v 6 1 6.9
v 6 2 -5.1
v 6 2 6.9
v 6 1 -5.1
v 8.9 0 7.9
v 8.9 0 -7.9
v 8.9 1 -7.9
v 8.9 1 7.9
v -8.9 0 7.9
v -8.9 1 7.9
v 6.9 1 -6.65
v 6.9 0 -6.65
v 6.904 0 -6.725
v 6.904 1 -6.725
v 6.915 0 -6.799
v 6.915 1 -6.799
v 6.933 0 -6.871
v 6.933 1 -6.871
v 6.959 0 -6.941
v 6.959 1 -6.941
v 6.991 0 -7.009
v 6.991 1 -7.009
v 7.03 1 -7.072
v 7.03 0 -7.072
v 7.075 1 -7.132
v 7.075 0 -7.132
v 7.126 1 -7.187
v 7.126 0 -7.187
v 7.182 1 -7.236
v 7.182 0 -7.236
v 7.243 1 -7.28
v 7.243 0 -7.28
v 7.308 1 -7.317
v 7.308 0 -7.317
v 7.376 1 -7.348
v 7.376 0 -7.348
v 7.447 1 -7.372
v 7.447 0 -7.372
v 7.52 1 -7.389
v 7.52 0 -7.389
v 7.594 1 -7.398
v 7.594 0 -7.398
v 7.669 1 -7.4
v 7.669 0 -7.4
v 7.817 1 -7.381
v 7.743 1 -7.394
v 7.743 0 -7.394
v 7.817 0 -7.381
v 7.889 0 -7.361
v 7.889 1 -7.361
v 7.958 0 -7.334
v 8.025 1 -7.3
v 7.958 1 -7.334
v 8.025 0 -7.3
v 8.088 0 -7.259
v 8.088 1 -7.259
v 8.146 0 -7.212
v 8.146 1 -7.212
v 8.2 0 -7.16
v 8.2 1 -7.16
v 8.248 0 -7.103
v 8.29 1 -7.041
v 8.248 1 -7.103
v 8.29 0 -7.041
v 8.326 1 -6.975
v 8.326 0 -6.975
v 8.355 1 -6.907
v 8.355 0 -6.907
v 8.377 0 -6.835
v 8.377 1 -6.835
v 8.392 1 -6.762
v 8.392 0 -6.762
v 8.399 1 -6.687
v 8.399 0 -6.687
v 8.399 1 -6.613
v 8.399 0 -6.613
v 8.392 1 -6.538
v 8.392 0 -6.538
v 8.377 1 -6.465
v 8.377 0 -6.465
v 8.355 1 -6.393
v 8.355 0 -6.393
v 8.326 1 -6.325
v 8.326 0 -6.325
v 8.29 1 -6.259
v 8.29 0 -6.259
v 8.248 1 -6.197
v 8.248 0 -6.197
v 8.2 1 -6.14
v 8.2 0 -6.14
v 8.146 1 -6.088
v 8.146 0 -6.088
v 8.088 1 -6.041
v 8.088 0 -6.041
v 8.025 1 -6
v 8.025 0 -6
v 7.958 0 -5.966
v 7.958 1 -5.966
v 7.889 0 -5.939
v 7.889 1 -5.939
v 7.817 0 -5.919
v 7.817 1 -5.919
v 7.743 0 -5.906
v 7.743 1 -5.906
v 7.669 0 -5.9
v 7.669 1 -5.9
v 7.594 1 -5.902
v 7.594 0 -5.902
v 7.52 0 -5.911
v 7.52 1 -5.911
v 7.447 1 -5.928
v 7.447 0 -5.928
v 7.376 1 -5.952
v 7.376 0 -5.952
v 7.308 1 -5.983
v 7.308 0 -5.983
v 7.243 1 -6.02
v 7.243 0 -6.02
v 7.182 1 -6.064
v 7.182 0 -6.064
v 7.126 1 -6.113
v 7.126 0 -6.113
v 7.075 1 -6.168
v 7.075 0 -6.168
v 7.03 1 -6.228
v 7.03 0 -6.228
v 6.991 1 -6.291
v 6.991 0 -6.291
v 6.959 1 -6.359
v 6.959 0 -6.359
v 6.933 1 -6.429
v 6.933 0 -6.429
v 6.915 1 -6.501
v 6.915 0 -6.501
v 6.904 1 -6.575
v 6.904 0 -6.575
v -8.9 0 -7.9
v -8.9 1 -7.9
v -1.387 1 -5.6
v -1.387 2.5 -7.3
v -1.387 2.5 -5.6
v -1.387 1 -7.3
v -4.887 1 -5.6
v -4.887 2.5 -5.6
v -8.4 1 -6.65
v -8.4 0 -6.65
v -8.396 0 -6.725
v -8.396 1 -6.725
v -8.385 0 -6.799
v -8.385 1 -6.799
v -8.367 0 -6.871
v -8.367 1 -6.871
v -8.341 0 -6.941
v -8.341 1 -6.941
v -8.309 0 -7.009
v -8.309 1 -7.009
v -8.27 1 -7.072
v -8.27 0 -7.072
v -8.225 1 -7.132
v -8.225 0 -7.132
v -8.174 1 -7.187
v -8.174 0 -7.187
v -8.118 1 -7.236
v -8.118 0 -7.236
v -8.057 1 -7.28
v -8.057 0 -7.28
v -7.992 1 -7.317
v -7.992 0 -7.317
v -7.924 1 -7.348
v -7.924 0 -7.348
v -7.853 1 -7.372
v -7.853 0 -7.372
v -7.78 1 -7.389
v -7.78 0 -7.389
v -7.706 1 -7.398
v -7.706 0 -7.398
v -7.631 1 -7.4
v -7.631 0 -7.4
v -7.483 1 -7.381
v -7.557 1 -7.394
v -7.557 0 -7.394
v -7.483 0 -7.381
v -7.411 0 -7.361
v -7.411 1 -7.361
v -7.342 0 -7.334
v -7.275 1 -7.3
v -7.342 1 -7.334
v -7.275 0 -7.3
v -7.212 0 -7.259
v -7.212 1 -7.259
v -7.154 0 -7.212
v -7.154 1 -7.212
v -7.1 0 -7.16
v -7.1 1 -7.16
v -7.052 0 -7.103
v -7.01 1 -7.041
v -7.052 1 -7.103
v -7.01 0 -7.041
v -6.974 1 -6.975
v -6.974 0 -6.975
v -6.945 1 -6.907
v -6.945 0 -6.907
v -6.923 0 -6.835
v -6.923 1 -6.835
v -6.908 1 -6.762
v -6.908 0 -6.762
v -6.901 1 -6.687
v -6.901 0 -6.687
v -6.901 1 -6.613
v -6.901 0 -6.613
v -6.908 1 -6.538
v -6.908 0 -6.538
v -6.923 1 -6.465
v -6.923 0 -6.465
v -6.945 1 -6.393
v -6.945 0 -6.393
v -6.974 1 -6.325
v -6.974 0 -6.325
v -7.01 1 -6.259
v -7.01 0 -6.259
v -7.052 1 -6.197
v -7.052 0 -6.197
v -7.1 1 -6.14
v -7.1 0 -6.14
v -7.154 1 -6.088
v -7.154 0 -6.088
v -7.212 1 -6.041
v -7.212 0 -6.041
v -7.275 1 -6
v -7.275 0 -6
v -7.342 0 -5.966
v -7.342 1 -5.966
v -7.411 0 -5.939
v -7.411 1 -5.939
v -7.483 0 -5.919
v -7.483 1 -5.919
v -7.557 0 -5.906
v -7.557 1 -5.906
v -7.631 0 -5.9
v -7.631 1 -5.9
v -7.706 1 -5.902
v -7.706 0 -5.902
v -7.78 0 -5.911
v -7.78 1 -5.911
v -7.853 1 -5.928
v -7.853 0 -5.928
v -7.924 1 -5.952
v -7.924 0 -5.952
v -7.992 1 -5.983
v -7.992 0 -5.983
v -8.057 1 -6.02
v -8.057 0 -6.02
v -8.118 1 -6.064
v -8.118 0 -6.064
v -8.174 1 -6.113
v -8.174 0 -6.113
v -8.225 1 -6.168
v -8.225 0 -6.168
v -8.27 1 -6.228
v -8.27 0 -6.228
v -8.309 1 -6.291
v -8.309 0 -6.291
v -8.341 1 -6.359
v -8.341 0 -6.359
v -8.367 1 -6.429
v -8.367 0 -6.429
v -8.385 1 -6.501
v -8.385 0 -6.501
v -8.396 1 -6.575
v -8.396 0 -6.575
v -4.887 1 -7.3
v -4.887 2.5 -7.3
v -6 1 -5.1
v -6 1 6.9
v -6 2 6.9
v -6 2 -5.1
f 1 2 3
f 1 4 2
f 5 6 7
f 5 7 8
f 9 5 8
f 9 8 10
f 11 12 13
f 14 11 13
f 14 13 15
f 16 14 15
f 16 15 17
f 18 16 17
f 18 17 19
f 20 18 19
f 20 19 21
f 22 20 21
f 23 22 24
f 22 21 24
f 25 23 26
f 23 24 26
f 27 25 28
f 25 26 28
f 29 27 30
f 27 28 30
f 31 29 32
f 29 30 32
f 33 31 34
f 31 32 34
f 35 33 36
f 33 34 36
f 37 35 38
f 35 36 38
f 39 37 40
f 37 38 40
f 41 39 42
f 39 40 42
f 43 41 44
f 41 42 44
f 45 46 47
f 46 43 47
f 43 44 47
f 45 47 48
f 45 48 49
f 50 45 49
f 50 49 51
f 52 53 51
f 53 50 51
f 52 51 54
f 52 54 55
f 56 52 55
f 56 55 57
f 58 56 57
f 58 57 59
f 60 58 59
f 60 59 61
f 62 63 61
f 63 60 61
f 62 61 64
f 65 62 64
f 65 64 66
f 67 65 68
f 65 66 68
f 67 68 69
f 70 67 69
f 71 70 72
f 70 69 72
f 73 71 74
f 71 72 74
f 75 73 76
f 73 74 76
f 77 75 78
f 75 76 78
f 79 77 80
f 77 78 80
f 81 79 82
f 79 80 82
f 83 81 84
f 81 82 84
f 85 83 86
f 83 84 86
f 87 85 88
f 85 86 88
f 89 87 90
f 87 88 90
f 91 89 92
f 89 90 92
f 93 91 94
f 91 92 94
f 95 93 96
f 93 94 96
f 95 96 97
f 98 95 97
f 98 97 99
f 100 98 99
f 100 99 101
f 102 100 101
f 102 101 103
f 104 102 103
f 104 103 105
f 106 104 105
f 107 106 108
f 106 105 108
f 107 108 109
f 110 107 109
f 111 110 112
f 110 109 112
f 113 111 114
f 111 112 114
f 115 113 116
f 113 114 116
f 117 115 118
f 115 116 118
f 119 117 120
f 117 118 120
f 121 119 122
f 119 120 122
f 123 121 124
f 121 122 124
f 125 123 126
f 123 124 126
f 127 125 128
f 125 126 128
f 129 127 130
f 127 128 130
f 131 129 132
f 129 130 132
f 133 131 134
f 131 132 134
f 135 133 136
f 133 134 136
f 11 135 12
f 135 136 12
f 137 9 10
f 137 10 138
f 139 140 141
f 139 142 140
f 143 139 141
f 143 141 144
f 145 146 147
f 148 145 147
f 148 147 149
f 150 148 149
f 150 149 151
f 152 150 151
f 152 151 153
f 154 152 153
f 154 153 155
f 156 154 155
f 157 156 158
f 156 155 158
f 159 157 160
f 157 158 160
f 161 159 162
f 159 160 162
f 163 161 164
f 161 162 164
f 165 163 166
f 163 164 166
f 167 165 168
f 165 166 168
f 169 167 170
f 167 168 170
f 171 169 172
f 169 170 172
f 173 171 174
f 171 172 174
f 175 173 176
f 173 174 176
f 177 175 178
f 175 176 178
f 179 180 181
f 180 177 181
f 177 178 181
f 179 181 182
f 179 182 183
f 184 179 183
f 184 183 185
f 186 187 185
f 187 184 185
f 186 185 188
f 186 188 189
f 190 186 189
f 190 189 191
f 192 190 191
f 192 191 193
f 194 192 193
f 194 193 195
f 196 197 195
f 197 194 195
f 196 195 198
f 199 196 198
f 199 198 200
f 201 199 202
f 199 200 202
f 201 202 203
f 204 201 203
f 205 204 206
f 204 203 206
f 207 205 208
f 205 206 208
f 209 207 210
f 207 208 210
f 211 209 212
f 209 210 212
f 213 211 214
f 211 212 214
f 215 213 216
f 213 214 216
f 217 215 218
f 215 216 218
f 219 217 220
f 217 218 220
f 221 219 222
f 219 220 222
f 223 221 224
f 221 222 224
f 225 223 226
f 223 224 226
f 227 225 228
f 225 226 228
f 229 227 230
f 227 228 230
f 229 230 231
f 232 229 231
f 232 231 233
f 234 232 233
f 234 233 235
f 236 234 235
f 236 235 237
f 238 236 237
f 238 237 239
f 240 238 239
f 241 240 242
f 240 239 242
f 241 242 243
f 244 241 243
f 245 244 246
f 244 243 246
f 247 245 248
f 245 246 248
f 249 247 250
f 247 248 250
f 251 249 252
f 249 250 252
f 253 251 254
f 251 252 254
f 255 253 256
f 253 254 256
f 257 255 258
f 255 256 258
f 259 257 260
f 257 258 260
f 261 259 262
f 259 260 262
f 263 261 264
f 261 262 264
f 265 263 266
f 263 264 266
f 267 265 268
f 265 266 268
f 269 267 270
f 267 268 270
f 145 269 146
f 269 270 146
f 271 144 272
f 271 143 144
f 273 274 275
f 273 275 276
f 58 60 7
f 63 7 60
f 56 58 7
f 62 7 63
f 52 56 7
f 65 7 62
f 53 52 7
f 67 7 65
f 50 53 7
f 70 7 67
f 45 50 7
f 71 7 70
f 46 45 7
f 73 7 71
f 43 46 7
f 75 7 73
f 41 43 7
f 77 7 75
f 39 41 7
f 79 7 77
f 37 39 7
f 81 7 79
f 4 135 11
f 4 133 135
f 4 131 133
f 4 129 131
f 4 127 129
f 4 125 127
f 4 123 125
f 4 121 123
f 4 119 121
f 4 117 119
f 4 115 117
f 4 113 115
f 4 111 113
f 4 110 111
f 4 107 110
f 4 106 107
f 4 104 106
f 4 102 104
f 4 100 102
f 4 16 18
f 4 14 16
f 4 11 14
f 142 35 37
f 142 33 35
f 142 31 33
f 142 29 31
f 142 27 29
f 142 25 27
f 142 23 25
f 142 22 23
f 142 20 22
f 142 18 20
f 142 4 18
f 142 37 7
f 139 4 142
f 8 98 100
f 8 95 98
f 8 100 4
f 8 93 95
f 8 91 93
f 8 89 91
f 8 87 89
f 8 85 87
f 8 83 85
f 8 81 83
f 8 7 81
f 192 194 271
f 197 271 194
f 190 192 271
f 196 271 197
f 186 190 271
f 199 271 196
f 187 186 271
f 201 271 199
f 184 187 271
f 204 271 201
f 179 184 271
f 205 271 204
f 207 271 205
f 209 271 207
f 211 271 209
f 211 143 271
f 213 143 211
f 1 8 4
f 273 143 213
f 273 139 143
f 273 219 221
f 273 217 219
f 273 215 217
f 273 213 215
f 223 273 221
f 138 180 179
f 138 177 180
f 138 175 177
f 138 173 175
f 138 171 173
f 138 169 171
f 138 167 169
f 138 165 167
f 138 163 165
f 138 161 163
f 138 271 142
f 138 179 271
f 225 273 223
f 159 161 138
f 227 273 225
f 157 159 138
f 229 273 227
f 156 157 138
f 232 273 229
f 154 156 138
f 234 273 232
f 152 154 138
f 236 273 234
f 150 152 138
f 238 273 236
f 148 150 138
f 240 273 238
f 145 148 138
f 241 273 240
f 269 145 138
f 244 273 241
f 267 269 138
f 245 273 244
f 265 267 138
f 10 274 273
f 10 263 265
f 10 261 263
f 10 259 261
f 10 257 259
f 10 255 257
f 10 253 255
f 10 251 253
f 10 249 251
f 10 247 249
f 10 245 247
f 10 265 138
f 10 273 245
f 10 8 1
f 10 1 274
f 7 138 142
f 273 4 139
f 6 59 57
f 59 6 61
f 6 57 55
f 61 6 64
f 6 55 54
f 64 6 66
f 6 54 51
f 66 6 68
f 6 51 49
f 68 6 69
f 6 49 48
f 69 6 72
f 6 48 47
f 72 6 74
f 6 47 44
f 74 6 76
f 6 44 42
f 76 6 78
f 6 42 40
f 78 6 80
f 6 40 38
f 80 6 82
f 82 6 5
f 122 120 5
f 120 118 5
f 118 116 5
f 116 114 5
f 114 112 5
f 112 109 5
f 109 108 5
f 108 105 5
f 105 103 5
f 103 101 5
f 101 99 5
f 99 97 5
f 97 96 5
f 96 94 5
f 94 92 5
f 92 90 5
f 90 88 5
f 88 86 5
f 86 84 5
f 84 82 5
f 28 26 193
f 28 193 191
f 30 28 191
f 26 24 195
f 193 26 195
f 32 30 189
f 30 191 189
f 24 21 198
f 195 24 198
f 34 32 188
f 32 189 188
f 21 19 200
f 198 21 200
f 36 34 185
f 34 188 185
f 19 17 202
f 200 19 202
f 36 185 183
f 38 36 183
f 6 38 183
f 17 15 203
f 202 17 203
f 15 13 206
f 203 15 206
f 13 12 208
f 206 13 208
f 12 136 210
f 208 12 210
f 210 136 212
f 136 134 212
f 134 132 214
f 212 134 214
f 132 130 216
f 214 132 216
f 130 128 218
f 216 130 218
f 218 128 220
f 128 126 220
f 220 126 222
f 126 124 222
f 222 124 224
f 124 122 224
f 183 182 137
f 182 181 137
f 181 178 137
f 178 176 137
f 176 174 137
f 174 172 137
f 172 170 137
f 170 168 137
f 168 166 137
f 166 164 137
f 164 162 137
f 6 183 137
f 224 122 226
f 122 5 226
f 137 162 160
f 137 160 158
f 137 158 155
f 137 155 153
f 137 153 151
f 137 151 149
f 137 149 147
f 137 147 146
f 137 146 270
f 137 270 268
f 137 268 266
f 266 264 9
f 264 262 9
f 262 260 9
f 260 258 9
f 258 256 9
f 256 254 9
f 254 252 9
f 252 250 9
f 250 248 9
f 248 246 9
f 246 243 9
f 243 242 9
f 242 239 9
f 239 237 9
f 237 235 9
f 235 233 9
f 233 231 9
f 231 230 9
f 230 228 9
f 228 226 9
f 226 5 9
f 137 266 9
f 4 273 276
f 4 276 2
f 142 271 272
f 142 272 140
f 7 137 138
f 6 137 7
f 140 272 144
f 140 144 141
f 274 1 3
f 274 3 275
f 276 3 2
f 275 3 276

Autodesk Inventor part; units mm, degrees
ref_plane "YZ Plane" through (0, 0, 0) normal (1, 0, 0) x (0, 1, 0)
ref_plane "XZ Plane" through (0, 0, 0) normal (0, 1, 0) x (-1, 0, 0)
ref_plane "XY Plane" through (0, 0, 0) normal (0, 0, 1) x (1, 0, 0)
sketch "Skizze1" plane through (0, 0, 0) normal (0, 1, 0) x (-1, 0, 0)
  line L0 (8.9, -7.9) -> (-8.9, -7.9)
  line L1 (-8.9, -7.9) -> (-8.9, 7.9)
  line L2 (-8.9, 7.9) -> (8.9, 7.9)
  line L3 (8.9, 7.9) -> (8.9, -7.9)
  line L4 (12.46, 0) -> (-12.46, 0) projected
  line L5 (0, -11.06) -> (0, 11.06) projected
  line L6 (6, -5.1) -> (-6, -5.1)
  line L7 (-6, -5.1) -> (-6, 6.9)
  line L8 (-6, 6.9) -> (6, 6.9)
  line L9 (6, 6.9) -> (6, -5.1)
  circle A0 centre (7.65, -6.65) radius 0.75
  circle A1 centre (-7.65, -6.65) radius 0.75
  dimension "d0" = 17.8
  dimension "d1" = 15.8
  dimension "d3" = 12
  dimension "d4" = 12
  dimension "d5" = 1
  dimension "d15" = 1.5
  dimension "d16" = 1.25
  dimension "d17" = 1.25
extrude "Extrusion1" add sketch "Skizze1" along normal blind 1 contours L0 L5 L6 L9 L4 L3 | L0 L1 L4 L7 L6 L5 | L4 L9 L8 L5 L2 L3 | L6 L7 L4 L5 | L5 L4 L9 L6 | L4 L5 L8 L9 | L1 L2 L5 L8 L7 L4 | L4 L7 L8 L5 | A0 | A1
extrude "Extrusion2" add sketch "Skizze1" along normal blind 2 contours L6 L7 L4 L5 | L5 L4 L9 L6 | L4 L5 L8 L9 | L4 L7 L8 L5
sketch "Skizze2" plane through (0, 1, 0) normal (0, 1, 0) x (1, 0, 0)
  line L0 (-4.8872, 7.3) -> (-1.3872, 7.3)
  line L1 (-1.3872, 7.3) -> (-1.3872, 5.6)
  line L2 (-1.3872, 5.6) -> (-4.8872, 5.6)
  line L3 (-4.8872, 5.6) -> (-4.8872, 7.3)
  line L4 (6, 5.1) -> (-6, 5.1) projected
  point P0 (0, 0)
  dimension "d10" = 3.5
  dimension "d11" = 1.7
  dimension "d12" = 0.5
extrude "Extrusion3" add sketch "Skizze2" along normal blind 1.5
extrude "Extrusion4" cut sketch "Skizze1" along normal blind 1 contours A0 | A1
properties part number "GSMModul"
